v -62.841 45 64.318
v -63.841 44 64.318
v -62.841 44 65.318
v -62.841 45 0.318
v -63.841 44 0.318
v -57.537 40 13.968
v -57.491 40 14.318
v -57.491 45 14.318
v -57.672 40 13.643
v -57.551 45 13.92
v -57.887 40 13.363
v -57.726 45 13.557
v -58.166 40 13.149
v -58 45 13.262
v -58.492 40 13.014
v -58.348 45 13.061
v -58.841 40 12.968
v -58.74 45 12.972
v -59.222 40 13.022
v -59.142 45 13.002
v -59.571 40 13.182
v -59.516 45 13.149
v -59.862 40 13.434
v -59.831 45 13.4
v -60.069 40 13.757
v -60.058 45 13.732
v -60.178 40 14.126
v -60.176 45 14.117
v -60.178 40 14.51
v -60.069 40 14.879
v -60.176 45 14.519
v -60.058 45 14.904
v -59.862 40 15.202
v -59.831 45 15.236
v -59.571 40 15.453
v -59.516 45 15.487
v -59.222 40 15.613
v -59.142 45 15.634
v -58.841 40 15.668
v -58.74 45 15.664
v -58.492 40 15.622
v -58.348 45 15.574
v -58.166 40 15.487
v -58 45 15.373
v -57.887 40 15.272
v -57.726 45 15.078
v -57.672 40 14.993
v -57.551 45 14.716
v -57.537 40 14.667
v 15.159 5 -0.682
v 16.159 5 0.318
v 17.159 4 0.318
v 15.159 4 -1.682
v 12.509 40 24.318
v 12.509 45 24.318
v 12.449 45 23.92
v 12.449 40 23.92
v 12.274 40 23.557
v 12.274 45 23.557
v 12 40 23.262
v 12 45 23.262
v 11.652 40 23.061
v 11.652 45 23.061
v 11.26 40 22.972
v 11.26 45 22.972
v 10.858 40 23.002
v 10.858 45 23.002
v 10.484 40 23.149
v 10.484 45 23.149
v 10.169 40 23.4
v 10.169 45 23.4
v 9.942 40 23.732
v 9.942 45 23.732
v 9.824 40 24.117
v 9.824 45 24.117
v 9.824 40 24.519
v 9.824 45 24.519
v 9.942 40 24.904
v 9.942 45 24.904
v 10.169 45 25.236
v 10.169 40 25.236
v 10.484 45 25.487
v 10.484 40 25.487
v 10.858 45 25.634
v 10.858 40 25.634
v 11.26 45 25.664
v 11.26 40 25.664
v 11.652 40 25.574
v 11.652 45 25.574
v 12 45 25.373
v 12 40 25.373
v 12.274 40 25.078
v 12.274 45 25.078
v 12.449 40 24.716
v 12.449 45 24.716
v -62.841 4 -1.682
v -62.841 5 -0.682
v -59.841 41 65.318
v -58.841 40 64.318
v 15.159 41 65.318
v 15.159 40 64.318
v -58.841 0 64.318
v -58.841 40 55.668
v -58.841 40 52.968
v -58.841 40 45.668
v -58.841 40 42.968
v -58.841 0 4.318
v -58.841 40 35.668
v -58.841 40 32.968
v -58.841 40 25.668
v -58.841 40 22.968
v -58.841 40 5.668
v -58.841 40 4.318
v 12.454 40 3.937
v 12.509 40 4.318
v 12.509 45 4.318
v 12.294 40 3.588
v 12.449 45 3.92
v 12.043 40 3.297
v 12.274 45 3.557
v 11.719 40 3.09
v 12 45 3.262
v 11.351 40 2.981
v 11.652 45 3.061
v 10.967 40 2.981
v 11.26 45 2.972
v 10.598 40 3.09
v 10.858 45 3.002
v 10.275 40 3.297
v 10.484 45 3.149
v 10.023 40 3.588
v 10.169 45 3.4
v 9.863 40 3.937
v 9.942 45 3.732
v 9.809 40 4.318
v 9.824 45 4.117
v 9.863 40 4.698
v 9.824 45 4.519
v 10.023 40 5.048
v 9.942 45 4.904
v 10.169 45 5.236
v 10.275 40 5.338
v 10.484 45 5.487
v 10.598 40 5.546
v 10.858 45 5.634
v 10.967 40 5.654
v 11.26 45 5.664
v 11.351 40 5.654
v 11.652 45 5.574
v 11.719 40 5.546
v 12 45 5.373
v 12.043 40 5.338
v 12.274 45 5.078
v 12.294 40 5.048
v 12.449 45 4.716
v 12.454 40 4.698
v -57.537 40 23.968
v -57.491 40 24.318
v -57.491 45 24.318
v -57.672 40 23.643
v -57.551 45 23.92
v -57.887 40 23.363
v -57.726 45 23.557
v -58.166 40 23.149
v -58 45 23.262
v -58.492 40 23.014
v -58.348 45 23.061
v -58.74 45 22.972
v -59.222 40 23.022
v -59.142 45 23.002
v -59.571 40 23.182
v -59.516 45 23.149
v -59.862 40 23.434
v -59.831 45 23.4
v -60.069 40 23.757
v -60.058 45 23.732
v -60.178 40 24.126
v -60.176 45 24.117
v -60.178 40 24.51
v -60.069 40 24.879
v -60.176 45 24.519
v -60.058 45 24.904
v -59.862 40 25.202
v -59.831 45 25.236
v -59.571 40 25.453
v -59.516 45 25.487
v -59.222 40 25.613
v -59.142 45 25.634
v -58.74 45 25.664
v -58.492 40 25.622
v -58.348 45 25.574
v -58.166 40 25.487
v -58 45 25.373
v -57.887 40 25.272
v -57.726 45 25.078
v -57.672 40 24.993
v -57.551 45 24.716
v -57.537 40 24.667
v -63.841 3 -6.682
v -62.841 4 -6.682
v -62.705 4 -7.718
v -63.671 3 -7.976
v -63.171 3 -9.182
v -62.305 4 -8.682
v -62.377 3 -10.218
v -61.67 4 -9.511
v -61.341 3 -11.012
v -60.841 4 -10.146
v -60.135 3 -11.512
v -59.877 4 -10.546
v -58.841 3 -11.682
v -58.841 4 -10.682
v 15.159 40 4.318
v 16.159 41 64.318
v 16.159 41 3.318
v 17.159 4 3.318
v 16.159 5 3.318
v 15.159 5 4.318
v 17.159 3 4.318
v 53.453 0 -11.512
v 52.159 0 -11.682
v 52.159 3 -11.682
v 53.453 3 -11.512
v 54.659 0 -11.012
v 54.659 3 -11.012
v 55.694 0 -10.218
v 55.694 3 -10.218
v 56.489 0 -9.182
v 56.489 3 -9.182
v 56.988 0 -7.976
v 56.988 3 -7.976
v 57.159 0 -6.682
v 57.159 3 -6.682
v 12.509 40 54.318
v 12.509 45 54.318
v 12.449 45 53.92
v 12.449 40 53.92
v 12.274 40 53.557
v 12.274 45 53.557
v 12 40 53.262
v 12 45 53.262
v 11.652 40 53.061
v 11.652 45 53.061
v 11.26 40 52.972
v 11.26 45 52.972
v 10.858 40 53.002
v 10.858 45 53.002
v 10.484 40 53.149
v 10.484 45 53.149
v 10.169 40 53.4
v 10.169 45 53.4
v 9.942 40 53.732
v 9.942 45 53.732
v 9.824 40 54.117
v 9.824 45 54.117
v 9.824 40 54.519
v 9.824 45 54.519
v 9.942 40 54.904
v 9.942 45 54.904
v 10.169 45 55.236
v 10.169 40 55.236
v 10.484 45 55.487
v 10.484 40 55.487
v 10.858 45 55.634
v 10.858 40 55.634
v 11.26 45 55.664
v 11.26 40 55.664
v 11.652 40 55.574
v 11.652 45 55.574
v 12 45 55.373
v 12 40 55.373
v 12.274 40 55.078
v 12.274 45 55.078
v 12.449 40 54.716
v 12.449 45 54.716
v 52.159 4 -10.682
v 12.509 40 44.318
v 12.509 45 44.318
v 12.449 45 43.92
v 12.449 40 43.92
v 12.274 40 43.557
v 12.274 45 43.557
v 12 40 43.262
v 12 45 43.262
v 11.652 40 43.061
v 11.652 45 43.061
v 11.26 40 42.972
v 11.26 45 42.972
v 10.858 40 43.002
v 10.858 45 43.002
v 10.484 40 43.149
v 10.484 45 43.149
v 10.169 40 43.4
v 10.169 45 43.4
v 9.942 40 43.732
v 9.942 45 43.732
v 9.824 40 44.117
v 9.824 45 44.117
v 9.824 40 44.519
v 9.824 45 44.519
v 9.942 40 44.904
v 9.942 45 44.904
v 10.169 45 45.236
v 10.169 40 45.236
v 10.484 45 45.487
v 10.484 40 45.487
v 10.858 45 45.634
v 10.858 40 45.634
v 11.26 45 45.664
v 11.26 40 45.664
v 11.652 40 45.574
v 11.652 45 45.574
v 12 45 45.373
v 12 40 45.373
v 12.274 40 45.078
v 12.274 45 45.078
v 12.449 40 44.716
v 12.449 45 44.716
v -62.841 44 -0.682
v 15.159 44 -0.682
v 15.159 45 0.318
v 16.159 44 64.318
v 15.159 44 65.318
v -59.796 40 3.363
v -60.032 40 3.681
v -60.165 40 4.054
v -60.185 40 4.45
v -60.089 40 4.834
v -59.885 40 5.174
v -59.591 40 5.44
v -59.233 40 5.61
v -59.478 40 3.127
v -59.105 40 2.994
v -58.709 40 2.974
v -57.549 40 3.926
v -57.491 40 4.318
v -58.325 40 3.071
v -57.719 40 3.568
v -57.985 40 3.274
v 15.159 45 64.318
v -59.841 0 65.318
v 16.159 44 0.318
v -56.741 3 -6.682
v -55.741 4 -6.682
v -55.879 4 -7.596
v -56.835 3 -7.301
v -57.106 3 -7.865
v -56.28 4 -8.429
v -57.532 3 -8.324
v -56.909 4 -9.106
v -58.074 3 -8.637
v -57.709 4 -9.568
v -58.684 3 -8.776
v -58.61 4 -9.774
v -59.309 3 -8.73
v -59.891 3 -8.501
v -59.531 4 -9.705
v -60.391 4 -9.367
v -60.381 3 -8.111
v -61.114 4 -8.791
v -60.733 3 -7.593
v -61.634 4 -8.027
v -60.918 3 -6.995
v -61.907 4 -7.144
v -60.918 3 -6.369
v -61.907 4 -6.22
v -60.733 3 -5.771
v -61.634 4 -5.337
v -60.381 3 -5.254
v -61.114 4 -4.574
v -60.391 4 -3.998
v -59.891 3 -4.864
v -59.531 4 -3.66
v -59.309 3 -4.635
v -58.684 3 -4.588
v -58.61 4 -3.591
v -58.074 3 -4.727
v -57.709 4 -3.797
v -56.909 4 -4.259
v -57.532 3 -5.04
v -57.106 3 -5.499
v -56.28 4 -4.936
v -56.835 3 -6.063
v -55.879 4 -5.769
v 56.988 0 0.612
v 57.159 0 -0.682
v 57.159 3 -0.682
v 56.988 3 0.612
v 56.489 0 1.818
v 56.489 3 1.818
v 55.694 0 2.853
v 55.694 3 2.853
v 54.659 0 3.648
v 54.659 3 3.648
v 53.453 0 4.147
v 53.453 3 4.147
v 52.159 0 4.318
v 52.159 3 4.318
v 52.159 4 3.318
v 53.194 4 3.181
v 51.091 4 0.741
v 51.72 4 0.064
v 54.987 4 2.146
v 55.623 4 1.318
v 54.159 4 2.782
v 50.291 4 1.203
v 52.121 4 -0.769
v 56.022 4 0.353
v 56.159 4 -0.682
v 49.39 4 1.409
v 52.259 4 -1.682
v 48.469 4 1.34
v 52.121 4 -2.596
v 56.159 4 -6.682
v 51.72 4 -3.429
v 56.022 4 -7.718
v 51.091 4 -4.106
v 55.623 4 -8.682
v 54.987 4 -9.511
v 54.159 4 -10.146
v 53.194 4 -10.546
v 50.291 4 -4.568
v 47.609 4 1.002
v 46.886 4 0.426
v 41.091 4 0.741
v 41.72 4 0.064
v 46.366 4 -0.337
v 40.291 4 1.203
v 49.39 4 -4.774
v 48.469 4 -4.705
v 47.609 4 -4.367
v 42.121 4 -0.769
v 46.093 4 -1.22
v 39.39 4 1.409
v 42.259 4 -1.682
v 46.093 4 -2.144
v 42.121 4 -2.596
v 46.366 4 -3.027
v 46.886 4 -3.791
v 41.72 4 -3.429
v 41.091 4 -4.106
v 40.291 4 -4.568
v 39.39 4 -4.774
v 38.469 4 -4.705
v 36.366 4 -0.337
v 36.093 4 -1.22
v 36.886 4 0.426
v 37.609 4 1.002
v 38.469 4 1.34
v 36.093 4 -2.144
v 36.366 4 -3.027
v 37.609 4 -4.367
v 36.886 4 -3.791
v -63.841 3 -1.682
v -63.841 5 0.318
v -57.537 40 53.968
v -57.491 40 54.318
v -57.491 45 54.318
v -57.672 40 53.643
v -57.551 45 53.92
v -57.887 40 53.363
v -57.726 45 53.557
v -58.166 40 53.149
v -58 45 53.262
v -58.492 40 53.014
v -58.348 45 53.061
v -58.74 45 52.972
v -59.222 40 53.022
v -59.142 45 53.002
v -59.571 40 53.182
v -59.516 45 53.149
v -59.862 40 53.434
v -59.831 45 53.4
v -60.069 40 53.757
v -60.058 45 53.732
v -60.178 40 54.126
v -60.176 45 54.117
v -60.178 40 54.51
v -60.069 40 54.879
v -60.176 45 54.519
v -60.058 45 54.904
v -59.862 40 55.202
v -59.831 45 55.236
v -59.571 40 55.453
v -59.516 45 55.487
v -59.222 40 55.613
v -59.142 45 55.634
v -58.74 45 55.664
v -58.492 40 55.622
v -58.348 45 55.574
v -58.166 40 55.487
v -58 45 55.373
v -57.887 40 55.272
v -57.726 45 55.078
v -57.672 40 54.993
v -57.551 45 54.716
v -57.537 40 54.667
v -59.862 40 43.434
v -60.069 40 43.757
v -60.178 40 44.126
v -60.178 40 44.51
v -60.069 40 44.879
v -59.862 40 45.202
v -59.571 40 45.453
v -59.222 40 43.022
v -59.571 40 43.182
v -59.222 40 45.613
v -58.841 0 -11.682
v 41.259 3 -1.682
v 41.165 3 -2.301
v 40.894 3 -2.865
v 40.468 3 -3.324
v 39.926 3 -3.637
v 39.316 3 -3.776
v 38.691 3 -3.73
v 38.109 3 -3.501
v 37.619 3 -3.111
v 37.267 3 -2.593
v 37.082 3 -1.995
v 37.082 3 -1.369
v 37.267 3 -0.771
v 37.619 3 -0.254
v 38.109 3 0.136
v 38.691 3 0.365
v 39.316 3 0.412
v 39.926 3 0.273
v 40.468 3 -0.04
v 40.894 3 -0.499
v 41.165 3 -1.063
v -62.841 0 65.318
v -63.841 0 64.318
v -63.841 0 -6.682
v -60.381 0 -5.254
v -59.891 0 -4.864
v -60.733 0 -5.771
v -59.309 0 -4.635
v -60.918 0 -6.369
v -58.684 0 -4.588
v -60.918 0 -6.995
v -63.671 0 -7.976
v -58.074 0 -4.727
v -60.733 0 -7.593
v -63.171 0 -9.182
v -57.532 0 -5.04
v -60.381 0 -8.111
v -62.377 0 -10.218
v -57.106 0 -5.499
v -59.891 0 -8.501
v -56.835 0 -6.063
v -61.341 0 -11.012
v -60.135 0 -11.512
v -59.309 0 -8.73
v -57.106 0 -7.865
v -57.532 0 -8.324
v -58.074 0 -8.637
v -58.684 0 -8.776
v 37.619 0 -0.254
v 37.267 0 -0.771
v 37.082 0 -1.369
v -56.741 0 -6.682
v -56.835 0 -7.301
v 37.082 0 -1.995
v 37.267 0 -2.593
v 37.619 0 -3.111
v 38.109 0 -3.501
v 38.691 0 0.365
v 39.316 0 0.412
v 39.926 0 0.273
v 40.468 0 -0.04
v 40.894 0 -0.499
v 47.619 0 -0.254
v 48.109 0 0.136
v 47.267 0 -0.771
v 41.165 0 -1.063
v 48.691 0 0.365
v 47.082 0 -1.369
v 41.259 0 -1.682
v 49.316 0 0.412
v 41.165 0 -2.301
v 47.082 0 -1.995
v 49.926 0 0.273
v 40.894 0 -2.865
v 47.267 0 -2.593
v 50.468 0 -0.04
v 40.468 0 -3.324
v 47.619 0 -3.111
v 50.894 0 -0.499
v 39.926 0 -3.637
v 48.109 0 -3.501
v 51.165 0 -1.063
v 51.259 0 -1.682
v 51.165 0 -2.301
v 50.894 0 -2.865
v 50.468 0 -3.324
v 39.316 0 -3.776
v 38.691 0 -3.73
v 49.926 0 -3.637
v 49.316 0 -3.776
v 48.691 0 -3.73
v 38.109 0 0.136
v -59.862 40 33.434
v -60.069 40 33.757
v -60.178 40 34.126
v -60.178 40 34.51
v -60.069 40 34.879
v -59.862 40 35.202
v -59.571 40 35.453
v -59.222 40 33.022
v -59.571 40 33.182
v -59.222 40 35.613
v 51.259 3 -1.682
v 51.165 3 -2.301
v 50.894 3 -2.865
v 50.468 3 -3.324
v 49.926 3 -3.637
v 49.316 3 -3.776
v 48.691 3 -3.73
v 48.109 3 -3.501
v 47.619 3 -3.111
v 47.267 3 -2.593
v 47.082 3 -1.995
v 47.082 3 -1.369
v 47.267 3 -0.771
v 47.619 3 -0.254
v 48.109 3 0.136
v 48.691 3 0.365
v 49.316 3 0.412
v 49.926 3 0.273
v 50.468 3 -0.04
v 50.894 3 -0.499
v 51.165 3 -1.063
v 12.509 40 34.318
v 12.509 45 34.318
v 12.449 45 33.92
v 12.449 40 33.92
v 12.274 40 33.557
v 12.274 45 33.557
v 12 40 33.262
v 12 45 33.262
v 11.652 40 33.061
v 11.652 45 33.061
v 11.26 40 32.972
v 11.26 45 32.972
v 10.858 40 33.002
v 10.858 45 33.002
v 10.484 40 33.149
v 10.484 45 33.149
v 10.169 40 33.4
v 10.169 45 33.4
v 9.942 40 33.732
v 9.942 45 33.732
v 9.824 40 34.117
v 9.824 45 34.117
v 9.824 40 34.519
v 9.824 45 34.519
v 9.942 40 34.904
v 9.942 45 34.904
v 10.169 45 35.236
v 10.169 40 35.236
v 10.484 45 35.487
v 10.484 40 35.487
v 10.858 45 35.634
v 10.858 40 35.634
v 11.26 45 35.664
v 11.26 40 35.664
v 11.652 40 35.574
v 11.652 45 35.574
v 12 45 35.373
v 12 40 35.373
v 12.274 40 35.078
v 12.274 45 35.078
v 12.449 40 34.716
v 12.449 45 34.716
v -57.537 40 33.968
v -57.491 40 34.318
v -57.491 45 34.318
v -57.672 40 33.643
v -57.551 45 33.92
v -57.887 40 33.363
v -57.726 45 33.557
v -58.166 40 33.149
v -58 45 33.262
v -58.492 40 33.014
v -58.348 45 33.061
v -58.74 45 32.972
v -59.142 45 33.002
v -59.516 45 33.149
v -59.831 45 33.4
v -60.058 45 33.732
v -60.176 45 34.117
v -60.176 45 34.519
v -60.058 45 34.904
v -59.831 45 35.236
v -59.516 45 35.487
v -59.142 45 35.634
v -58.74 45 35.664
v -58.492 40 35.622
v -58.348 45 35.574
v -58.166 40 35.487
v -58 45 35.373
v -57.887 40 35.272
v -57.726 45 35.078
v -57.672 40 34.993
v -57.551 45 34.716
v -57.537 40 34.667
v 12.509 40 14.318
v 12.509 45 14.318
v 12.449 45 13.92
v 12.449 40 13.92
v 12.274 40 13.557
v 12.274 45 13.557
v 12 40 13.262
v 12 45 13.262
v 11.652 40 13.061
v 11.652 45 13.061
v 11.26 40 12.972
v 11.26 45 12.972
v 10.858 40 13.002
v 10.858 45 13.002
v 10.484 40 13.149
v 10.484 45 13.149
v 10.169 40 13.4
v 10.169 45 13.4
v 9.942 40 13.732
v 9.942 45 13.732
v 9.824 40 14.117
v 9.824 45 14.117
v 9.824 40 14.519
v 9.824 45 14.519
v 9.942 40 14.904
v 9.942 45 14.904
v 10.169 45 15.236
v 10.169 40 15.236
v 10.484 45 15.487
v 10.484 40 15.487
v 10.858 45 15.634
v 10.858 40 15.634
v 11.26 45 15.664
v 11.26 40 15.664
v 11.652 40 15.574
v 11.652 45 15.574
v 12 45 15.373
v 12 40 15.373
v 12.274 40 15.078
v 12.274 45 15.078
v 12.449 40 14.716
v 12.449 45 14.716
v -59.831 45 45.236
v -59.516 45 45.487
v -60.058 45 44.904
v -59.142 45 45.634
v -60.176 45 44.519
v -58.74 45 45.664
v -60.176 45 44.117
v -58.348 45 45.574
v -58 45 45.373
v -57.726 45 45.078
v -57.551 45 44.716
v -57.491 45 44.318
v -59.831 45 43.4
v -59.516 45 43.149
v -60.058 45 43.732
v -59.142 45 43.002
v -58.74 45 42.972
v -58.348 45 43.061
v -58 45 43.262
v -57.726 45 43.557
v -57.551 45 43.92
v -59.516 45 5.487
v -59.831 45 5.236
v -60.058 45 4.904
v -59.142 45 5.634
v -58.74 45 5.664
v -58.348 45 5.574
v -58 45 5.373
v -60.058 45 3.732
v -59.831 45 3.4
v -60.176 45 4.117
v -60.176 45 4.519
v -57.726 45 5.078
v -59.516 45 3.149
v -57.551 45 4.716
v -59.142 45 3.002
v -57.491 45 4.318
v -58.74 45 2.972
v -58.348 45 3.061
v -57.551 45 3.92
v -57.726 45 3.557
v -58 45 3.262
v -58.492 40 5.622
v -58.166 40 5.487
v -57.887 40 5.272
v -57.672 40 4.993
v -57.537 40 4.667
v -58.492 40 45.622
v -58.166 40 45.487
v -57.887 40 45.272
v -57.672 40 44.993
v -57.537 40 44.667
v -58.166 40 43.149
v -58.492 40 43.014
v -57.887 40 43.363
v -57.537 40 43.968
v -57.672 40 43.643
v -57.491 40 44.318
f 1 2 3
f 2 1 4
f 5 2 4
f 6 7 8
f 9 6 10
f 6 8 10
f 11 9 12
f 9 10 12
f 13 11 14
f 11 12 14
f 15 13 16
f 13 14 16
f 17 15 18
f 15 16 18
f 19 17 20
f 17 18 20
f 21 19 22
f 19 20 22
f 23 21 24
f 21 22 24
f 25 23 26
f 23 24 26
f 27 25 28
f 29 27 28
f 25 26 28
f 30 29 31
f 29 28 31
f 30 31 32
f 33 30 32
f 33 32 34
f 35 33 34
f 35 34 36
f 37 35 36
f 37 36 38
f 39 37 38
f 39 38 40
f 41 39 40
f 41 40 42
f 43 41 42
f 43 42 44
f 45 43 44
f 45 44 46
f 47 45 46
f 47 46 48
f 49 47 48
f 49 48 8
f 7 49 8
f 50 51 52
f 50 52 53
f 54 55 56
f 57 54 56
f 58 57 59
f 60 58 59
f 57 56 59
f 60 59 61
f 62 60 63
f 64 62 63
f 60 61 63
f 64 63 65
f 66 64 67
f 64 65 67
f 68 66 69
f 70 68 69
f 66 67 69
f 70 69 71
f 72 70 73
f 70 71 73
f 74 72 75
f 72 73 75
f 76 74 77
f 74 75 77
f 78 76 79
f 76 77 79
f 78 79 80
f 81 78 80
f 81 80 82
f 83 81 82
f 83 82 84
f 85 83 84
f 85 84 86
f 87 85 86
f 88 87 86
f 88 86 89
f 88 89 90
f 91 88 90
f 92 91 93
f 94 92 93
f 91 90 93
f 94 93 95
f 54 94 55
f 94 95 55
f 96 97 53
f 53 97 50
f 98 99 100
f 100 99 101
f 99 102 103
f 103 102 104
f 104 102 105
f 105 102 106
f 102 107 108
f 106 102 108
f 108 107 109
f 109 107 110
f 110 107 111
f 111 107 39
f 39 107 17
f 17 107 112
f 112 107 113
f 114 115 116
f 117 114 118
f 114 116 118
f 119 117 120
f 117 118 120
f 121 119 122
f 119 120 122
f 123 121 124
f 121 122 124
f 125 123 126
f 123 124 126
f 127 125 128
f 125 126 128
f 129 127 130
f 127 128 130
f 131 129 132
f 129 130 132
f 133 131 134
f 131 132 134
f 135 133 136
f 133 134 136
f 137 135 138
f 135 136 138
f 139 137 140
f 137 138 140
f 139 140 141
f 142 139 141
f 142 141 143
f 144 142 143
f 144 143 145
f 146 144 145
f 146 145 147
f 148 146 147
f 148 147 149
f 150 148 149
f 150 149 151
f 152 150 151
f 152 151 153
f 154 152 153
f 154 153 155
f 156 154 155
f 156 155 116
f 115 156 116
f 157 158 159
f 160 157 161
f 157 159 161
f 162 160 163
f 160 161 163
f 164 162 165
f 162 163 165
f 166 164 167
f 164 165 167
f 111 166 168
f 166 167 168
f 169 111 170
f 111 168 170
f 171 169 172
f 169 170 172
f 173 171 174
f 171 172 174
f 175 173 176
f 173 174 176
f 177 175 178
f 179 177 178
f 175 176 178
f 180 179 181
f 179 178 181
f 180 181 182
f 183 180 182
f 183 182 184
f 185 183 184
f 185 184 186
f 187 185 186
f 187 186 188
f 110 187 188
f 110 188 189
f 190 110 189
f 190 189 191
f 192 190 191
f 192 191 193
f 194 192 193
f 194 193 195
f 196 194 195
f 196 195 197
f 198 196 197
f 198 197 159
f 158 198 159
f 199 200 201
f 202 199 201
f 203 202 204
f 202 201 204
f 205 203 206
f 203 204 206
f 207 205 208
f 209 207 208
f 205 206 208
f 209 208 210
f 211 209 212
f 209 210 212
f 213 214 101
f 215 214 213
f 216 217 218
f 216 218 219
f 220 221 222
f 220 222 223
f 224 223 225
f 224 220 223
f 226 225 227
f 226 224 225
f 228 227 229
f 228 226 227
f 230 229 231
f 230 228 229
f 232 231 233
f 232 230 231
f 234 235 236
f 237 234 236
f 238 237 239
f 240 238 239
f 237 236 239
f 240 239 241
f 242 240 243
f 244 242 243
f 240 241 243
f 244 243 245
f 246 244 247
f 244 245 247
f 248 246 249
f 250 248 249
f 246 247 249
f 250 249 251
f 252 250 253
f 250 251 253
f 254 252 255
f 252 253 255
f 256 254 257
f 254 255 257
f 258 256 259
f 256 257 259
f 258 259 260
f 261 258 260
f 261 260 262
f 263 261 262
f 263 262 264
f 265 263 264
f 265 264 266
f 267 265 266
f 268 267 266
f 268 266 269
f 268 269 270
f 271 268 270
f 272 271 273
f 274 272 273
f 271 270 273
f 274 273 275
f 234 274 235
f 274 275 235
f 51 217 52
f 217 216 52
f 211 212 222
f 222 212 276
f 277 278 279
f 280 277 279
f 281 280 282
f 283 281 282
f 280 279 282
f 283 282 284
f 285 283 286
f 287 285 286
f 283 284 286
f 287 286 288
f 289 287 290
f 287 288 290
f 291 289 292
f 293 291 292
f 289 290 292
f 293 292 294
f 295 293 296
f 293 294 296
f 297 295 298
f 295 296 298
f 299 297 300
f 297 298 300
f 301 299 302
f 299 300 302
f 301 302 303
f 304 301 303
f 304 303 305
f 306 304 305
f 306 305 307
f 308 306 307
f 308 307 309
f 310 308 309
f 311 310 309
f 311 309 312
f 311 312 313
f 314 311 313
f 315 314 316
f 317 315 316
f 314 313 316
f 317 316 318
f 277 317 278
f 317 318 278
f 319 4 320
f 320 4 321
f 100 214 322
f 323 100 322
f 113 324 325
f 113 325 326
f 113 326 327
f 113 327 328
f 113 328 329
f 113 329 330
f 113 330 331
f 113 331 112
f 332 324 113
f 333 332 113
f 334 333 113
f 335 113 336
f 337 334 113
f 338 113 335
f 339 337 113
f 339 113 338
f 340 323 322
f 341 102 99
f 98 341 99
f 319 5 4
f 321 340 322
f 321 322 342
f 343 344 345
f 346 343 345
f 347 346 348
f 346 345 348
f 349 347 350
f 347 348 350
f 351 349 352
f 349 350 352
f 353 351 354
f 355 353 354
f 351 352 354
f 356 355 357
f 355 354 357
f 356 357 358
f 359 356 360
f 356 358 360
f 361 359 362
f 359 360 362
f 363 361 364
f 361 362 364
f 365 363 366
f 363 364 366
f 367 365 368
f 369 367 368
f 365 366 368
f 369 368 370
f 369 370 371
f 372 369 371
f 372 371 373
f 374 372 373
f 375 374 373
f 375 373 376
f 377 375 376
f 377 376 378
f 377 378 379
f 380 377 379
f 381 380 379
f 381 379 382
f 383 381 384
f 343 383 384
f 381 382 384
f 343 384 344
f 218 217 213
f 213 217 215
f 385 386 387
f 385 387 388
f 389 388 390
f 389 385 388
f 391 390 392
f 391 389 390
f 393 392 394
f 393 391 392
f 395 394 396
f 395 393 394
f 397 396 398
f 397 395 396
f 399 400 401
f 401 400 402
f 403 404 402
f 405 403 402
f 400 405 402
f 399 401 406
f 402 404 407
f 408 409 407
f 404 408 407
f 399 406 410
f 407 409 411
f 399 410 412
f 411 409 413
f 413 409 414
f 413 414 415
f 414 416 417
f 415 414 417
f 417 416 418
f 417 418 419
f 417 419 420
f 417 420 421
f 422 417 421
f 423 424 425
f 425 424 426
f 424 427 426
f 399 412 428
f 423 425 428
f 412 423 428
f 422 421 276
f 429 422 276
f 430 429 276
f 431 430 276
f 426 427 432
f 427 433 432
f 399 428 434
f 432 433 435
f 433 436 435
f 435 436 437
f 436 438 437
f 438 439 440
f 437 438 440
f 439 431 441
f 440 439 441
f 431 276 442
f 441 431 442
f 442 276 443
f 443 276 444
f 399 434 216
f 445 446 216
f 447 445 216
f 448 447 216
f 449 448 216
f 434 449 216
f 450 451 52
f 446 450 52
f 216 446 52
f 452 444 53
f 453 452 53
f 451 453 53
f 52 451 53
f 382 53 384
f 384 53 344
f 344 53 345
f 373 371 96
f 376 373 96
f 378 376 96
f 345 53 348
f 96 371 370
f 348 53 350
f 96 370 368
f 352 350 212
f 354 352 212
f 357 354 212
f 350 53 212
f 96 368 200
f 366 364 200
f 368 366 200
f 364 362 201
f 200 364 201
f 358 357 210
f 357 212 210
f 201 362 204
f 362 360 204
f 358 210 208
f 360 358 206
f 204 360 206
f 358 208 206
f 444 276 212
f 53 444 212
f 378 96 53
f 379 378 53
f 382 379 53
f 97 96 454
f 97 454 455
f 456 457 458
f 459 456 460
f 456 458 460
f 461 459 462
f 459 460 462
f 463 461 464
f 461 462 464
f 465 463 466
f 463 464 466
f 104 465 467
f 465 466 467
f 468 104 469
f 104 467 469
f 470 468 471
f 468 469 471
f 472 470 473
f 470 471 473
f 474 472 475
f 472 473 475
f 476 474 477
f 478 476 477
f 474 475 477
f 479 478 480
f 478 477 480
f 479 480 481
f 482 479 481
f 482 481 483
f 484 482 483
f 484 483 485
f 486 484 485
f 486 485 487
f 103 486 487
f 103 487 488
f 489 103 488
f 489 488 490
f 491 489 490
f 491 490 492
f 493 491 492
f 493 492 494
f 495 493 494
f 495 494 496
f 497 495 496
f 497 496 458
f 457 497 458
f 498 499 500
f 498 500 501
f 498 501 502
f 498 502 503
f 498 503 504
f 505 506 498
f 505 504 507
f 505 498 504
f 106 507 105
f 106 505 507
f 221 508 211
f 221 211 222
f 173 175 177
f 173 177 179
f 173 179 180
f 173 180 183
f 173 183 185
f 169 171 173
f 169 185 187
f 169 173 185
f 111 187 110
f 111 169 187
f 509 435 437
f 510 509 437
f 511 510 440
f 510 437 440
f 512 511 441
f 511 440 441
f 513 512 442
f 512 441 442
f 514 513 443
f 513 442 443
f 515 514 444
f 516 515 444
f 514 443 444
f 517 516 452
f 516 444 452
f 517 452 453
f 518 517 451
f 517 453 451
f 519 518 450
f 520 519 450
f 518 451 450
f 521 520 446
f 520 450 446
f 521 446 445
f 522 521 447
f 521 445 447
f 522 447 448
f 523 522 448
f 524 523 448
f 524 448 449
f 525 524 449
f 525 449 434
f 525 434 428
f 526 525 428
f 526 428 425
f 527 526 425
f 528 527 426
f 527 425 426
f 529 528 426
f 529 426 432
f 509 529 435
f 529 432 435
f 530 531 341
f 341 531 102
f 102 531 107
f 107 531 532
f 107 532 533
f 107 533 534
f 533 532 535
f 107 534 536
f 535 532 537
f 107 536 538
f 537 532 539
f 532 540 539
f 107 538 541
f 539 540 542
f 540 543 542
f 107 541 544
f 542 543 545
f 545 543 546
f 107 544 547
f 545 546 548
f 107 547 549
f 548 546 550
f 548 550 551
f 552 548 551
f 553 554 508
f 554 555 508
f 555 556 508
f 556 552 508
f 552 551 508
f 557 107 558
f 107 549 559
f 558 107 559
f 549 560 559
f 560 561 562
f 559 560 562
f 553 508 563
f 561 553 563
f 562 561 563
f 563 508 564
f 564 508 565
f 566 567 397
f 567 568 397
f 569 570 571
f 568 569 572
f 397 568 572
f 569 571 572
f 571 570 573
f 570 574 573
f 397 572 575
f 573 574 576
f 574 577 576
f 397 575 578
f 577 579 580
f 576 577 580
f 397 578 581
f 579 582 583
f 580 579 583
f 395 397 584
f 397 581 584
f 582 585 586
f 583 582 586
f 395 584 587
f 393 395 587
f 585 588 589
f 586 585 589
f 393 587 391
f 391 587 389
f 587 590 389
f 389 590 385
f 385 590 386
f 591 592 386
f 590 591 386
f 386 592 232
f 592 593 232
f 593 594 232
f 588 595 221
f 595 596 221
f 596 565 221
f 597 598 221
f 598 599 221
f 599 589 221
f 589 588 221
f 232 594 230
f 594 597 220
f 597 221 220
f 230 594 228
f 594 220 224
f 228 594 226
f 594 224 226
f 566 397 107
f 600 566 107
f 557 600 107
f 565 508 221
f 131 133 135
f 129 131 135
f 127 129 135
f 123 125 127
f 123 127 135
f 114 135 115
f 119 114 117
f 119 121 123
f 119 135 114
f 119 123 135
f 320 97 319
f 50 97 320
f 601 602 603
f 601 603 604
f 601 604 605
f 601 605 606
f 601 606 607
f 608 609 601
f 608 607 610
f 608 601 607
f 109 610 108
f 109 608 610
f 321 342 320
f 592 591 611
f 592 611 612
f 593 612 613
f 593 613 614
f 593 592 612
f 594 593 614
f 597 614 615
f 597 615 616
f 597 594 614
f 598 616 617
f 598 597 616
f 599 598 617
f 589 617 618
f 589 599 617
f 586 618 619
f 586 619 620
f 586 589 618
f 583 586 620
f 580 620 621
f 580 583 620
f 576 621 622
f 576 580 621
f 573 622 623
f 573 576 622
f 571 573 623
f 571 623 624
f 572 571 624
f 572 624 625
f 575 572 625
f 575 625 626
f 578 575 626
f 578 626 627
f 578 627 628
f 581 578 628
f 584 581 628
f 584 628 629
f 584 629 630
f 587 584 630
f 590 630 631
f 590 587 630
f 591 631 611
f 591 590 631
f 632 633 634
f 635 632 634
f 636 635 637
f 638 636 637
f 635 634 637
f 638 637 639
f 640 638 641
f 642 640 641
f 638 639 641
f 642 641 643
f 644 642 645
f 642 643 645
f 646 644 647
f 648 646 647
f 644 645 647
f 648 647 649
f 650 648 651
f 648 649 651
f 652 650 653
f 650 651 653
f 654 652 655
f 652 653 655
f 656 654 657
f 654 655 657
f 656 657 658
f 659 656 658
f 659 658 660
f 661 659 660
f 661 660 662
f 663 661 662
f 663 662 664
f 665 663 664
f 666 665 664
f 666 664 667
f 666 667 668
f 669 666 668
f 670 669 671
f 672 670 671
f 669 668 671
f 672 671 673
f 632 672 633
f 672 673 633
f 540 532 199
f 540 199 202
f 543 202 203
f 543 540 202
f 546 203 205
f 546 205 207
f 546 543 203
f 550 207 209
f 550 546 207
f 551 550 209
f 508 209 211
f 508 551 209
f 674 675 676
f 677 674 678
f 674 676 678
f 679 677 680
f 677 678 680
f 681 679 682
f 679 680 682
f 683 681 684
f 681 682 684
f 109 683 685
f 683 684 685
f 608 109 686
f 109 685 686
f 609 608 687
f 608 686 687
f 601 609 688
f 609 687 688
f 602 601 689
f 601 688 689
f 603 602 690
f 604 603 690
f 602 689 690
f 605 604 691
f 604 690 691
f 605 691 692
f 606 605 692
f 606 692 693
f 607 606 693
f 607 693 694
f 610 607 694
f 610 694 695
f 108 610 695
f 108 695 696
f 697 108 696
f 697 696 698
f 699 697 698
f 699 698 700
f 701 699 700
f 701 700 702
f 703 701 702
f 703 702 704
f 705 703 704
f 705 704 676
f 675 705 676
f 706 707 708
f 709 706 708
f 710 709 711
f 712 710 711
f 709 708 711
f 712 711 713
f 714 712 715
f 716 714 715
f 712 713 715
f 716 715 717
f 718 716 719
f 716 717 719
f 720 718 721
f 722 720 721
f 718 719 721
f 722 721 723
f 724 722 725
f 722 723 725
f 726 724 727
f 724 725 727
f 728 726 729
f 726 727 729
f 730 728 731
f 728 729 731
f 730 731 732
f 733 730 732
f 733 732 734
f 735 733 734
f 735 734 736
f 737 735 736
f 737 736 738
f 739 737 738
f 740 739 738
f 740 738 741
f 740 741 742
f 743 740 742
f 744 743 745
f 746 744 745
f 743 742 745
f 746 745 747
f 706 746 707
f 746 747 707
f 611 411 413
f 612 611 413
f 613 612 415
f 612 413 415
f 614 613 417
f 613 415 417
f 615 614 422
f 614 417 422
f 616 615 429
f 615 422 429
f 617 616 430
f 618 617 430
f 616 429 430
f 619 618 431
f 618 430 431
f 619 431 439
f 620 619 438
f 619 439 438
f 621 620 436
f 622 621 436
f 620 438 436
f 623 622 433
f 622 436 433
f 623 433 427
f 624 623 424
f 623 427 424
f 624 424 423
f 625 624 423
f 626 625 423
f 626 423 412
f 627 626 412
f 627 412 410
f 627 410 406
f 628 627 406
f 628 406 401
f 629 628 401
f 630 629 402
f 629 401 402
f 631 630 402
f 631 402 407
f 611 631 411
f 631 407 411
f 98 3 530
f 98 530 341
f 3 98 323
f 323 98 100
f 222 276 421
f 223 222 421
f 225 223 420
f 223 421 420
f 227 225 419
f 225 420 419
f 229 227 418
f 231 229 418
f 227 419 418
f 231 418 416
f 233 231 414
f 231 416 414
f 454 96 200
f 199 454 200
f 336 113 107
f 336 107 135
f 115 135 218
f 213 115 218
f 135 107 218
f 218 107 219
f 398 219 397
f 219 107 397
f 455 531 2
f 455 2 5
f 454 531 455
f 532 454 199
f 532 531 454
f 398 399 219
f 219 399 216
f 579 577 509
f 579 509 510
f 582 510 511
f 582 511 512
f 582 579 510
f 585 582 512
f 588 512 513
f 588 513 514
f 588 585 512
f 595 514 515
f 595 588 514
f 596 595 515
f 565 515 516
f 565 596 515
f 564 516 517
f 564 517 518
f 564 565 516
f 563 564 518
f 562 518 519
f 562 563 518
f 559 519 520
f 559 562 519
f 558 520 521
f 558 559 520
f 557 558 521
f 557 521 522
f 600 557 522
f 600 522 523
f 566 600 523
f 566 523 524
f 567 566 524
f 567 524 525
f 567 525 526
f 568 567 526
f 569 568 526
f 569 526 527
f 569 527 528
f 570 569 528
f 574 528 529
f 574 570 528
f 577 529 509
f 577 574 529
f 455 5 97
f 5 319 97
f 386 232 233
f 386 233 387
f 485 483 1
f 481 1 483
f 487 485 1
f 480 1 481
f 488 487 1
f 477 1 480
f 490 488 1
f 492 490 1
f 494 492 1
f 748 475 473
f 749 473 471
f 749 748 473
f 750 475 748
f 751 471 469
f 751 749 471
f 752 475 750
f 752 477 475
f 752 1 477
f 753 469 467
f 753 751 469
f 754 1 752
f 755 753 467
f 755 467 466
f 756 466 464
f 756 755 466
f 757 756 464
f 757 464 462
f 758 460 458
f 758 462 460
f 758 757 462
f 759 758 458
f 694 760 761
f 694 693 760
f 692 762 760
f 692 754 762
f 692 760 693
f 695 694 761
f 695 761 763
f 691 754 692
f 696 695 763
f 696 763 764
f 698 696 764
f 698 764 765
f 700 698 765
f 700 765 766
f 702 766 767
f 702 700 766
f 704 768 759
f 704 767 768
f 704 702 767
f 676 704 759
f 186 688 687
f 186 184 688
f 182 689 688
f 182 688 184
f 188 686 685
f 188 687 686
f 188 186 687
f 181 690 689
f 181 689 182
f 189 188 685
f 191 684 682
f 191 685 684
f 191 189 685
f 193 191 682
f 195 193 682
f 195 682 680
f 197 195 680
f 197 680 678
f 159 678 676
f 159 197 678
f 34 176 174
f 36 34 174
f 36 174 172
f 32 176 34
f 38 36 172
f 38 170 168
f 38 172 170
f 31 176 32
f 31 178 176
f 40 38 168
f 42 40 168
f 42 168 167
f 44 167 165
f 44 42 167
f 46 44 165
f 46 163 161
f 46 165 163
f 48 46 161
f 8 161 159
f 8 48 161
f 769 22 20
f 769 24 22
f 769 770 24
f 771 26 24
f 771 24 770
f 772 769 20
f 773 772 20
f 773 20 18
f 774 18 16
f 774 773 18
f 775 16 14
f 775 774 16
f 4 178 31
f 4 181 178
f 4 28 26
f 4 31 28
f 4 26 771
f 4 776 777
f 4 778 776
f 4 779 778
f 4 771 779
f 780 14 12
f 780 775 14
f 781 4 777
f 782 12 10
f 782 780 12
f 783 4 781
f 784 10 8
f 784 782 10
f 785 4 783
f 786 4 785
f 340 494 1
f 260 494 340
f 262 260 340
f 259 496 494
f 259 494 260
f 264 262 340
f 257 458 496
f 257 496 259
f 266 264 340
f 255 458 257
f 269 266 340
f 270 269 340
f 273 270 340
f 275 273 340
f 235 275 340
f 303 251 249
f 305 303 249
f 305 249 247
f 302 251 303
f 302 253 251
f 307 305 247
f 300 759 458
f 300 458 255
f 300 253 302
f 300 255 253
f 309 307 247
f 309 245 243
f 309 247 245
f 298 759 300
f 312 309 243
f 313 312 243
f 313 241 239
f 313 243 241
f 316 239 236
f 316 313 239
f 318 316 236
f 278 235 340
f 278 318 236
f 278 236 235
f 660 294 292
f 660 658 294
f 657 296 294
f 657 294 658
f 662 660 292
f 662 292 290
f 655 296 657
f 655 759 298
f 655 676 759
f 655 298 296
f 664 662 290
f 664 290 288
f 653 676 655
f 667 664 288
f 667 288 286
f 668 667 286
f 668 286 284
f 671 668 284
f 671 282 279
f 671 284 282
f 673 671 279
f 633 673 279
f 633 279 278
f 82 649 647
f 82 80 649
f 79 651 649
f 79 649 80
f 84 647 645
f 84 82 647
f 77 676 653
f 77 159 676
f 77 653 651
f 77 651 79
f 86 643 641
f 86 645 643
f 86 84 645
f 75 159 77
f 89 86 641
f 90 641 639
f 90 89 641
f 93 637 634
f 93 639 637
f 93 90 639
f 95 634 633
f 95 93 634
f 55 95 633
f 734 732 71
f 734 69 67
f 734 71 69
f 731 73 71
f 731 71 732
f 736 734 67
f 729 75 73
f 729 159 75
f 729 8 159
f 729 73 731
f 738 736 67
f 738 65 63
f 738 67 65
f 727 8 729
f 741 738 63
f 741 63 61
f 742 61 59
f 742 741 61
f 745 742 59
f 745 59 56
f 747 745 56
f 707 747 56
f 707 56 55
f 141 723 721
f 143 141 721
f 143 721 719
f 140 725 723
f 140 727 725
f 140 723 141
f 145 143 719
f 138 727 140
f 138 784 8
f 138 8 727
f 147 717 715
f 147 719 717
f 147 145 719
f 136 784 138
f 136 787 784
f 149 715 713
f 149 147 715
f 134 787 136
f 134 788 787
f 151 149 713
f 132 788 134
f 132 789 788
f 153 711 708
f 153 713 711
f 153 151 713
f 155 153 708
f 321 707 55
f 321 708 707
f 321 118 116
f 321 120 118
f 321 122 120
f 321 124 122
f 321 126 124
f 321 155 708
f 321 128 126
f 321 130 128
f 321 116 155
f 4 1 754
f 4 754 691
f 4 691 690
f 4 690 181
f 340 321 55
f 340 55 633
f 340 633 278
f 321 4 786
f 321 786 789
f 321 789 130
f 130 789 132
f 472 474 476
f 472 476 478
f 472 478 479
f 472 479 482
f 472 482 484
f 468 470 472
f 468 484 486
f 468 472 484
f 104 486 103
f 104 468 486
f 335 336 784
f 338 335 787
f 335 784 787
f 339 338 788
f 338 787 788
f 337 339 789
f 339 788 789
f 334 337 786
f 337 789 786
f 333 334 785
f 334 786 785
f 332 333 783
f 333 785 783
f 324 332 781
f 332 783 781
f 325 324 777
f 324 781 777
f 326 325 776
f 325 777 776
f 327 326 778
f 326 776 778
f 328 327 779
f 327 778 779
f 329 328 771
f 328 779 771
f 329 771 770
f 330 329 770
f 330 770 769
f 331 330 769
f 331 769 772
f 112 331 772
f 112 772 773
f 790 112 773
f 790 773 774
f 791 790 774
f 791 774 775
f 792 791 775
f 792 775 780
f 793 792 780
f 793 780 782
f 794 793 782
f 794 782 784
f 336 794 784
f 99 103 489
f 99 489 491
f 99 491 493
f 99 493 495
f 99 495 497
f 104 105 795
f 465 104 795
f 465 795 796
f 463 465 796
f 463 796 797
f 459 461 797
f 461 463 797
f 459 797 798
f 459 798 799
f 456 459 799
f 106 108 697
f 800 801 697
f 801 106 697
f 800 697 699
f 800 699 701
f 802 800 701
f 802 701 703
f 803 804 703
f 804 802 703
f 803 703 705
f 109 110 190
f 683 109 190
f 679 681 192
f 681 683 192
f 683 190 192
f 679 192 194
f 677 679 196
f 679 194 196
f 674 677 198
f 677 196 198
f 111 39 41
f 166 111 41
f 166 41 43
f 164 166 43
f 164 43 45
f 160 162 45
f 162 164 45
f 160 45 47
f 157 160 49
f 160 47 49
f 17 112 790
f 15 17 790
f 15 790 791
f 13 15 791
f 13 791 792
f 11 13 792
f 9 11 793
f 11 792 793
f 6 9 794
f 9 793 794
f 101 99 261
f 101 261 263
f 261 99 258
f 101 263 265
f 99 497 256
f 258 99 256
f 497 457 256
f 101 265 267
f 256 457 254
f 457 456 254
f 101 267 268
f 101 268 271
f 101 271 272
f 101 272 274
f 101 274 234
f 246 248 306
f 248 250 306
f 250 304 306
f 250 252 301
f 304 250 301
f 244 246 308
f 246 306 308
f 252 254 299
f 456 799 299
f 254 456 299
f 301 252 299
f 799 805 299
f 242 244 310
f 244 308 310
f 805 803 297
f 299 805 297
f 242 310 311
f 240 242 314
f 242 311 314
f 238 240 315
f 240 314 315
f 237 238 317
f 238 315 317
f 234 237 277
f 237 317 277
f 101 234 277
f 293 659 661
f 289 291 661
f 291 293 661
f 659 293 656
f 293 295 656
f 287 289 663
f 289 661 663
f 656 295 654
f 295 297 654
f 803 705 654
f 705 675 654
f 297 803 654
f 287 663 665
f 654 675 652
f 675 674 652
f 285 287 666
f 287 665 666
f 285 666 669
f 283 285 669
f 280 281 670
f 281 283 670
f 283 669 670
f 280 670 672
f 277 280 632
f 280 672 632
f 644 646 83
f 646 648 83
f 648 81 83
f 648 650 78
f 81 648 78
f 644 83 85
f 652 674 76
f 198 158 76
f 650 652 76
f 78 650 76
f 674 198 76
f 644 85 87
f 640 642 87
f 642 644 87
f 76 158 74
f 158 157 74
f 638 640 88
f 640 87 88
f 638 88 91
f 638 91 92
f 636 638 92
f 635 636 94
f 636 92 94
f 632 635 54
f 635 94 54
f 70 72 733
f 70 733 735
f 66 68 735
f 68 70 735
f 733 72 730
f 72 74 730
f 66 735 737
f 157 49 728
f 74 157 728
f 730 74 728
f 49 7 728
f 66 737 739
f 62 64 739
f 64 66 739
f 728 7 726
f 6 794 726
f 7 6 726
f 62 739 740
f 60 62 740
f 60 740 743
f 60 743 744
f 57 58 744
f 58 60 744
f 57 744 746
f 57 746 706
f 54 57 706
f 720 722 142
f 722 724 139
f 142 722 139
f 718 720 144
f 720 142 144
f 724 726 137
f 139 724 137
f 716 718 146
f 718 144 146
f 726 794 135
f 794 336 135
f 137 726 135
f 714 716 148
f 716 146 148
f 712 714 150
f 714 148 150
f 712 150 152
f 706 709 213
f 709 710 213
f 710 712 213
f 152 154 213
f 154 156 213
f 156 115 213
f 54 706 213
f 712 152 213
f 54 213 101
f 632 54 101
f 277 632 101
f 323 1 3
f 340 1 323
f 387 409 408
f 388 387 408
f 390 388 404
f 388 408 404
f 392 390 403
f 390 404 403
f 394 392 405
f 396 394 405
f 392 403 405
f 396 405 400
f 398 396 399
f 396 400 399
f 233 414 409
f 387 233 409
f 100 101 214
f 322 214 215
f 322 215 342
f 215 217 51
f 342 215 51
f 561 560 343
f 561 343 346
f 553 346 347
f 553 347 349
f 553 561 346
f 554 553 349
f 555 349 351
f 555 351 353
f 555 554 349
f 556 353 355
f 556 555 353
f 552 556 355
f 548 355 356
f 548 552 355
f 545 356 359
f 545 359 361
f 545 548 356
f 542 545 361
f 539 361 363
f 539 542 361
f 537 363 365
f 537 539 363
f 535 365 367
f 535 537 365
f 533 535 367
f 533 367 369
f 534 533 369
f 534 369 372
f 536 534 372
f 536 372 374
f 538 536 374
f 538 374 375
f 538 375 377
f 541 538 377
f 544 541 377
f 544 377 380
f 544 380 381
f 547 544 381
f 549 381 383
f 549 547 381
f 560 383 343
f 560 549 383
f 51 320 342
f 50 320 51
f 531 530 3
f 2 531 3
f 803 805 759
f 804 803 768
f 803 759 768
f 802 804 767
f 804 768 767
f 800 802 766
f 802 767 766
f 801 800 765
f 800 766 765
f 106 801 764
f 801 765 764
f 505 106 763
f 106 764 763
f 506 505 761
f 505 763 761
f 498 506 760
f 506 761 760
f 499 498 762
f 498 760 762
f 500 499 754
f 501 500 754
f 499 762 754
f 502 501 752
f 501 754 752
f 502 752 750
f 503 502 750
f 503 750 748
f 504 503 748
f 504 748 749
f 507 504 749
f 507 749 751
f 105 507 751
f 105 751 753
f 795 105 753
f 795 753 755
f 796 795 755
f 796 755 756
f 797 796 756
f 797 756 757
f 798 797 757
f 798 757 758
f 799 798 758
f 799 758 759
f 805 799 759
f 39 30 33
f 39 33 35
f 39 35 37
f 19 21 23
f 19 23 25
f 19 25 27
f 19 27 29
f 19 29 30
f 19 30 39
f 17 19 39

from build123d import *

# Parameters (mm, degrees)
SKETCH1_R           = 2.1
BOSS_EXTRUDE1_DEPTH = 4
SKETCH2_W           = 80
SKETCH2_H           = 5
BOSS_EXTRUDE2_DEPTH = 36
SKETCH3_W           = 5
SKETCH3_H           = 40
BOSS_EXTRUDE3_DEPTH = 61
SKETCH4_W           = 80
SKETCH4_H           = 66
BOSS_EXTRUDE4_DEPTH = 5
CHAMFER2_SIZE       = 1
SKETCH5_R           = 1.35
CUT_EXTRUDE1_DEPTH  = 5


with BuildPart() as part:
    # Sketch1 → Boss-Extrude1 (new body)
    with BuildSketch(Plane(origin=(0, 0, 0), x_dir=(1, 0, 0), z_dir=(0, 1, 0))):
        with BuildLine():
            Line((-58.8413396, 11.682242991), (52.1586604, 11.682242991))
            ThreePointArc((52.1586604, 11.682242991), (55.694194306, 10.217776897), (57.1586604, 6.682242991))
            Line((57.1586604, 6.682242991), (57.1586604, 0.682242991))
            ThreePointArc((57.1586604, 0.682242991), (55.694194306, -2.853290915), (52.1586604, -4.317757009))
            Line((52.1586604, -4.317757009), (-63.8413396, -4.317757009))
            Line((-63.8413396, -4.317757009), (-63.8413396, 6.682242991))
            ThreePointArc((-63.8413396, 6.682242991), (-62.376873506, 10.217776897), (-58.8413396, 11.682242991))
        make_face()
        with Locations((-58.8413396, 6.682242991)):
            Circle(SKETCH1_R, mode=Mode.SUBTRACT)
        with Locations((39.1586604, 1.682242991)):
            Circle(SKETCH1_R, mode=Mode.SUBTRACT)
        with Locations((49.1586604, 1.682242991)):
            Circle(SKETCH1_R, mode=Mode.SUBTRACT)
    extrude(amount=BOSS_EXTRUDE1_DEPTH)

    # Sketch2 → Boss-Extrude2 (add)
    with BuildSketch(Plane(origin=(0, 4, 0), x_dir=(1, 0, 0), z_dir=(0, 1, 0))):
        with Locations((-23.8413396, -1.817757009)):
            Rectangle(SKETCH2_W, SKETCH2_H)
    extrude(amount=BOSS_EXTRUDE2_DEPTH)

    # Sketch3 → Boss-Extrude3 (add)
    with BuildSketch(Plane.XY.offset(4.317757009)):
        with Locations((-61.3413396, 20)):
            Rectangle(SKETCH3_W, SKETCH3_H)
    extrude(amount=BOSS_EXTRUDE3_DEPTH)

    # Sketch4 → Boss-Extrude4 (add)
    with BuildSketch(Plane(origin=(0, 40, 0), x_dir=(1, 0, 0), z_dir=(0, 1, 0))):
        with Locations((-23.8413396, -32.317757009)):
            Rectangle(SKETCH4_W, SKETCH4_H)
    extrude(amount=BOSS_EXTRUDE4_DEPTH)

    # Chamfer2
    chamfer2_edges = [part.edges().sort_by_distance(p)[0] for p in [
        (55.694194306, 4, 2.853290915),
        (-60.9413396, 4, -6.682242991),
        (57.1586604, 4, -3.682242991),
        (37.0586604, 4, -1.682242991),
        (55.694194306, 4, -10.217776897),
        (47.0586604, 4, -1.682242991),
        (-3.3413396, 4, -11.682242991),
        (34.1586604, 4, 4.317757009),
        (-63.8413396, 24.5, -0.682242991),
        (16.1586604, 4, 1.817757009),
        (16.1586604, 22, 4.317757009),
        (-23.8413396, 4, -0.682242991),
        (16.1586604, 24.5, -0.682242991),
        (-62.376873506, 4, -10.217776897),
        (-63.8413396, 22.5, 65.317757009),
        (-58.8413396, 20, 65.317757009),
        (-21.3413396, 40, 65.317757009),
        (16.1586604, 40, 34.817757009),
        (16.1586604, 42.5, 65.317757009),
        (-63.8413396, 45, 32.317757009),
        (-23.8413396, 45, 65.317757009),
        (16.1586604, 45, 32.317757009),
        (-23.8413396, 45, -0.682242991),
        (-63.8413396, 4, -3.682242991),
    ]]
    chamfer(chamfer2_edges, length=CHAMFER2_SIZE)

    # Sketch5 → Cut-Extrude1 (cut)
    with BuildSketch(Plane(origin=(0, 45, 0), x_dir=(1, 0, 0), z_dir=(0, 1, 0))):
        with Locations((11.1586604, -4.317757009)):
            Circle(SKETCH5_R)
        with Locations((-58.8413396, -4.317757009)):
            Circle(SKETCH5_R)
        with Locations((-58.8413396, -14.317757009)):
            Circle(SKETCH5_R)
        with Locations((11.1586604, -14.317757009)):
            Circle(SKETCH5_R)
        with Locations((-58.8413396, -24.317757009)):
            Circle(SKETCH5_R)
        with Locations((11.1586604, -24.317757009)):
            Circle(SKETCH5_R)
        with Locations((-58.8413396, -34.317757009)):
            Circle(SKETCH5_R)
        with Locations((11.1586604, -34.317757009)):
            Circle(SKETCH5_R)
        with Locations((-58.8413396, -44.317757009)):
            Circle(SKETCH5_R)
        with Locations((11.1586604, -44.317757009)):
            Circle(SKETCH5_R)
        with Locations((-58.8413396, -54.317757009)):
            Circle(SKETCH5_R)
        with Locations((11.1586604, -54.317757009)):
            Circle(SKETCH5_R)
    extrude(amount=-CUT_EXTRUDE1_DEPTH, mode=Mode.SUBTRACT)


solid = part.part
